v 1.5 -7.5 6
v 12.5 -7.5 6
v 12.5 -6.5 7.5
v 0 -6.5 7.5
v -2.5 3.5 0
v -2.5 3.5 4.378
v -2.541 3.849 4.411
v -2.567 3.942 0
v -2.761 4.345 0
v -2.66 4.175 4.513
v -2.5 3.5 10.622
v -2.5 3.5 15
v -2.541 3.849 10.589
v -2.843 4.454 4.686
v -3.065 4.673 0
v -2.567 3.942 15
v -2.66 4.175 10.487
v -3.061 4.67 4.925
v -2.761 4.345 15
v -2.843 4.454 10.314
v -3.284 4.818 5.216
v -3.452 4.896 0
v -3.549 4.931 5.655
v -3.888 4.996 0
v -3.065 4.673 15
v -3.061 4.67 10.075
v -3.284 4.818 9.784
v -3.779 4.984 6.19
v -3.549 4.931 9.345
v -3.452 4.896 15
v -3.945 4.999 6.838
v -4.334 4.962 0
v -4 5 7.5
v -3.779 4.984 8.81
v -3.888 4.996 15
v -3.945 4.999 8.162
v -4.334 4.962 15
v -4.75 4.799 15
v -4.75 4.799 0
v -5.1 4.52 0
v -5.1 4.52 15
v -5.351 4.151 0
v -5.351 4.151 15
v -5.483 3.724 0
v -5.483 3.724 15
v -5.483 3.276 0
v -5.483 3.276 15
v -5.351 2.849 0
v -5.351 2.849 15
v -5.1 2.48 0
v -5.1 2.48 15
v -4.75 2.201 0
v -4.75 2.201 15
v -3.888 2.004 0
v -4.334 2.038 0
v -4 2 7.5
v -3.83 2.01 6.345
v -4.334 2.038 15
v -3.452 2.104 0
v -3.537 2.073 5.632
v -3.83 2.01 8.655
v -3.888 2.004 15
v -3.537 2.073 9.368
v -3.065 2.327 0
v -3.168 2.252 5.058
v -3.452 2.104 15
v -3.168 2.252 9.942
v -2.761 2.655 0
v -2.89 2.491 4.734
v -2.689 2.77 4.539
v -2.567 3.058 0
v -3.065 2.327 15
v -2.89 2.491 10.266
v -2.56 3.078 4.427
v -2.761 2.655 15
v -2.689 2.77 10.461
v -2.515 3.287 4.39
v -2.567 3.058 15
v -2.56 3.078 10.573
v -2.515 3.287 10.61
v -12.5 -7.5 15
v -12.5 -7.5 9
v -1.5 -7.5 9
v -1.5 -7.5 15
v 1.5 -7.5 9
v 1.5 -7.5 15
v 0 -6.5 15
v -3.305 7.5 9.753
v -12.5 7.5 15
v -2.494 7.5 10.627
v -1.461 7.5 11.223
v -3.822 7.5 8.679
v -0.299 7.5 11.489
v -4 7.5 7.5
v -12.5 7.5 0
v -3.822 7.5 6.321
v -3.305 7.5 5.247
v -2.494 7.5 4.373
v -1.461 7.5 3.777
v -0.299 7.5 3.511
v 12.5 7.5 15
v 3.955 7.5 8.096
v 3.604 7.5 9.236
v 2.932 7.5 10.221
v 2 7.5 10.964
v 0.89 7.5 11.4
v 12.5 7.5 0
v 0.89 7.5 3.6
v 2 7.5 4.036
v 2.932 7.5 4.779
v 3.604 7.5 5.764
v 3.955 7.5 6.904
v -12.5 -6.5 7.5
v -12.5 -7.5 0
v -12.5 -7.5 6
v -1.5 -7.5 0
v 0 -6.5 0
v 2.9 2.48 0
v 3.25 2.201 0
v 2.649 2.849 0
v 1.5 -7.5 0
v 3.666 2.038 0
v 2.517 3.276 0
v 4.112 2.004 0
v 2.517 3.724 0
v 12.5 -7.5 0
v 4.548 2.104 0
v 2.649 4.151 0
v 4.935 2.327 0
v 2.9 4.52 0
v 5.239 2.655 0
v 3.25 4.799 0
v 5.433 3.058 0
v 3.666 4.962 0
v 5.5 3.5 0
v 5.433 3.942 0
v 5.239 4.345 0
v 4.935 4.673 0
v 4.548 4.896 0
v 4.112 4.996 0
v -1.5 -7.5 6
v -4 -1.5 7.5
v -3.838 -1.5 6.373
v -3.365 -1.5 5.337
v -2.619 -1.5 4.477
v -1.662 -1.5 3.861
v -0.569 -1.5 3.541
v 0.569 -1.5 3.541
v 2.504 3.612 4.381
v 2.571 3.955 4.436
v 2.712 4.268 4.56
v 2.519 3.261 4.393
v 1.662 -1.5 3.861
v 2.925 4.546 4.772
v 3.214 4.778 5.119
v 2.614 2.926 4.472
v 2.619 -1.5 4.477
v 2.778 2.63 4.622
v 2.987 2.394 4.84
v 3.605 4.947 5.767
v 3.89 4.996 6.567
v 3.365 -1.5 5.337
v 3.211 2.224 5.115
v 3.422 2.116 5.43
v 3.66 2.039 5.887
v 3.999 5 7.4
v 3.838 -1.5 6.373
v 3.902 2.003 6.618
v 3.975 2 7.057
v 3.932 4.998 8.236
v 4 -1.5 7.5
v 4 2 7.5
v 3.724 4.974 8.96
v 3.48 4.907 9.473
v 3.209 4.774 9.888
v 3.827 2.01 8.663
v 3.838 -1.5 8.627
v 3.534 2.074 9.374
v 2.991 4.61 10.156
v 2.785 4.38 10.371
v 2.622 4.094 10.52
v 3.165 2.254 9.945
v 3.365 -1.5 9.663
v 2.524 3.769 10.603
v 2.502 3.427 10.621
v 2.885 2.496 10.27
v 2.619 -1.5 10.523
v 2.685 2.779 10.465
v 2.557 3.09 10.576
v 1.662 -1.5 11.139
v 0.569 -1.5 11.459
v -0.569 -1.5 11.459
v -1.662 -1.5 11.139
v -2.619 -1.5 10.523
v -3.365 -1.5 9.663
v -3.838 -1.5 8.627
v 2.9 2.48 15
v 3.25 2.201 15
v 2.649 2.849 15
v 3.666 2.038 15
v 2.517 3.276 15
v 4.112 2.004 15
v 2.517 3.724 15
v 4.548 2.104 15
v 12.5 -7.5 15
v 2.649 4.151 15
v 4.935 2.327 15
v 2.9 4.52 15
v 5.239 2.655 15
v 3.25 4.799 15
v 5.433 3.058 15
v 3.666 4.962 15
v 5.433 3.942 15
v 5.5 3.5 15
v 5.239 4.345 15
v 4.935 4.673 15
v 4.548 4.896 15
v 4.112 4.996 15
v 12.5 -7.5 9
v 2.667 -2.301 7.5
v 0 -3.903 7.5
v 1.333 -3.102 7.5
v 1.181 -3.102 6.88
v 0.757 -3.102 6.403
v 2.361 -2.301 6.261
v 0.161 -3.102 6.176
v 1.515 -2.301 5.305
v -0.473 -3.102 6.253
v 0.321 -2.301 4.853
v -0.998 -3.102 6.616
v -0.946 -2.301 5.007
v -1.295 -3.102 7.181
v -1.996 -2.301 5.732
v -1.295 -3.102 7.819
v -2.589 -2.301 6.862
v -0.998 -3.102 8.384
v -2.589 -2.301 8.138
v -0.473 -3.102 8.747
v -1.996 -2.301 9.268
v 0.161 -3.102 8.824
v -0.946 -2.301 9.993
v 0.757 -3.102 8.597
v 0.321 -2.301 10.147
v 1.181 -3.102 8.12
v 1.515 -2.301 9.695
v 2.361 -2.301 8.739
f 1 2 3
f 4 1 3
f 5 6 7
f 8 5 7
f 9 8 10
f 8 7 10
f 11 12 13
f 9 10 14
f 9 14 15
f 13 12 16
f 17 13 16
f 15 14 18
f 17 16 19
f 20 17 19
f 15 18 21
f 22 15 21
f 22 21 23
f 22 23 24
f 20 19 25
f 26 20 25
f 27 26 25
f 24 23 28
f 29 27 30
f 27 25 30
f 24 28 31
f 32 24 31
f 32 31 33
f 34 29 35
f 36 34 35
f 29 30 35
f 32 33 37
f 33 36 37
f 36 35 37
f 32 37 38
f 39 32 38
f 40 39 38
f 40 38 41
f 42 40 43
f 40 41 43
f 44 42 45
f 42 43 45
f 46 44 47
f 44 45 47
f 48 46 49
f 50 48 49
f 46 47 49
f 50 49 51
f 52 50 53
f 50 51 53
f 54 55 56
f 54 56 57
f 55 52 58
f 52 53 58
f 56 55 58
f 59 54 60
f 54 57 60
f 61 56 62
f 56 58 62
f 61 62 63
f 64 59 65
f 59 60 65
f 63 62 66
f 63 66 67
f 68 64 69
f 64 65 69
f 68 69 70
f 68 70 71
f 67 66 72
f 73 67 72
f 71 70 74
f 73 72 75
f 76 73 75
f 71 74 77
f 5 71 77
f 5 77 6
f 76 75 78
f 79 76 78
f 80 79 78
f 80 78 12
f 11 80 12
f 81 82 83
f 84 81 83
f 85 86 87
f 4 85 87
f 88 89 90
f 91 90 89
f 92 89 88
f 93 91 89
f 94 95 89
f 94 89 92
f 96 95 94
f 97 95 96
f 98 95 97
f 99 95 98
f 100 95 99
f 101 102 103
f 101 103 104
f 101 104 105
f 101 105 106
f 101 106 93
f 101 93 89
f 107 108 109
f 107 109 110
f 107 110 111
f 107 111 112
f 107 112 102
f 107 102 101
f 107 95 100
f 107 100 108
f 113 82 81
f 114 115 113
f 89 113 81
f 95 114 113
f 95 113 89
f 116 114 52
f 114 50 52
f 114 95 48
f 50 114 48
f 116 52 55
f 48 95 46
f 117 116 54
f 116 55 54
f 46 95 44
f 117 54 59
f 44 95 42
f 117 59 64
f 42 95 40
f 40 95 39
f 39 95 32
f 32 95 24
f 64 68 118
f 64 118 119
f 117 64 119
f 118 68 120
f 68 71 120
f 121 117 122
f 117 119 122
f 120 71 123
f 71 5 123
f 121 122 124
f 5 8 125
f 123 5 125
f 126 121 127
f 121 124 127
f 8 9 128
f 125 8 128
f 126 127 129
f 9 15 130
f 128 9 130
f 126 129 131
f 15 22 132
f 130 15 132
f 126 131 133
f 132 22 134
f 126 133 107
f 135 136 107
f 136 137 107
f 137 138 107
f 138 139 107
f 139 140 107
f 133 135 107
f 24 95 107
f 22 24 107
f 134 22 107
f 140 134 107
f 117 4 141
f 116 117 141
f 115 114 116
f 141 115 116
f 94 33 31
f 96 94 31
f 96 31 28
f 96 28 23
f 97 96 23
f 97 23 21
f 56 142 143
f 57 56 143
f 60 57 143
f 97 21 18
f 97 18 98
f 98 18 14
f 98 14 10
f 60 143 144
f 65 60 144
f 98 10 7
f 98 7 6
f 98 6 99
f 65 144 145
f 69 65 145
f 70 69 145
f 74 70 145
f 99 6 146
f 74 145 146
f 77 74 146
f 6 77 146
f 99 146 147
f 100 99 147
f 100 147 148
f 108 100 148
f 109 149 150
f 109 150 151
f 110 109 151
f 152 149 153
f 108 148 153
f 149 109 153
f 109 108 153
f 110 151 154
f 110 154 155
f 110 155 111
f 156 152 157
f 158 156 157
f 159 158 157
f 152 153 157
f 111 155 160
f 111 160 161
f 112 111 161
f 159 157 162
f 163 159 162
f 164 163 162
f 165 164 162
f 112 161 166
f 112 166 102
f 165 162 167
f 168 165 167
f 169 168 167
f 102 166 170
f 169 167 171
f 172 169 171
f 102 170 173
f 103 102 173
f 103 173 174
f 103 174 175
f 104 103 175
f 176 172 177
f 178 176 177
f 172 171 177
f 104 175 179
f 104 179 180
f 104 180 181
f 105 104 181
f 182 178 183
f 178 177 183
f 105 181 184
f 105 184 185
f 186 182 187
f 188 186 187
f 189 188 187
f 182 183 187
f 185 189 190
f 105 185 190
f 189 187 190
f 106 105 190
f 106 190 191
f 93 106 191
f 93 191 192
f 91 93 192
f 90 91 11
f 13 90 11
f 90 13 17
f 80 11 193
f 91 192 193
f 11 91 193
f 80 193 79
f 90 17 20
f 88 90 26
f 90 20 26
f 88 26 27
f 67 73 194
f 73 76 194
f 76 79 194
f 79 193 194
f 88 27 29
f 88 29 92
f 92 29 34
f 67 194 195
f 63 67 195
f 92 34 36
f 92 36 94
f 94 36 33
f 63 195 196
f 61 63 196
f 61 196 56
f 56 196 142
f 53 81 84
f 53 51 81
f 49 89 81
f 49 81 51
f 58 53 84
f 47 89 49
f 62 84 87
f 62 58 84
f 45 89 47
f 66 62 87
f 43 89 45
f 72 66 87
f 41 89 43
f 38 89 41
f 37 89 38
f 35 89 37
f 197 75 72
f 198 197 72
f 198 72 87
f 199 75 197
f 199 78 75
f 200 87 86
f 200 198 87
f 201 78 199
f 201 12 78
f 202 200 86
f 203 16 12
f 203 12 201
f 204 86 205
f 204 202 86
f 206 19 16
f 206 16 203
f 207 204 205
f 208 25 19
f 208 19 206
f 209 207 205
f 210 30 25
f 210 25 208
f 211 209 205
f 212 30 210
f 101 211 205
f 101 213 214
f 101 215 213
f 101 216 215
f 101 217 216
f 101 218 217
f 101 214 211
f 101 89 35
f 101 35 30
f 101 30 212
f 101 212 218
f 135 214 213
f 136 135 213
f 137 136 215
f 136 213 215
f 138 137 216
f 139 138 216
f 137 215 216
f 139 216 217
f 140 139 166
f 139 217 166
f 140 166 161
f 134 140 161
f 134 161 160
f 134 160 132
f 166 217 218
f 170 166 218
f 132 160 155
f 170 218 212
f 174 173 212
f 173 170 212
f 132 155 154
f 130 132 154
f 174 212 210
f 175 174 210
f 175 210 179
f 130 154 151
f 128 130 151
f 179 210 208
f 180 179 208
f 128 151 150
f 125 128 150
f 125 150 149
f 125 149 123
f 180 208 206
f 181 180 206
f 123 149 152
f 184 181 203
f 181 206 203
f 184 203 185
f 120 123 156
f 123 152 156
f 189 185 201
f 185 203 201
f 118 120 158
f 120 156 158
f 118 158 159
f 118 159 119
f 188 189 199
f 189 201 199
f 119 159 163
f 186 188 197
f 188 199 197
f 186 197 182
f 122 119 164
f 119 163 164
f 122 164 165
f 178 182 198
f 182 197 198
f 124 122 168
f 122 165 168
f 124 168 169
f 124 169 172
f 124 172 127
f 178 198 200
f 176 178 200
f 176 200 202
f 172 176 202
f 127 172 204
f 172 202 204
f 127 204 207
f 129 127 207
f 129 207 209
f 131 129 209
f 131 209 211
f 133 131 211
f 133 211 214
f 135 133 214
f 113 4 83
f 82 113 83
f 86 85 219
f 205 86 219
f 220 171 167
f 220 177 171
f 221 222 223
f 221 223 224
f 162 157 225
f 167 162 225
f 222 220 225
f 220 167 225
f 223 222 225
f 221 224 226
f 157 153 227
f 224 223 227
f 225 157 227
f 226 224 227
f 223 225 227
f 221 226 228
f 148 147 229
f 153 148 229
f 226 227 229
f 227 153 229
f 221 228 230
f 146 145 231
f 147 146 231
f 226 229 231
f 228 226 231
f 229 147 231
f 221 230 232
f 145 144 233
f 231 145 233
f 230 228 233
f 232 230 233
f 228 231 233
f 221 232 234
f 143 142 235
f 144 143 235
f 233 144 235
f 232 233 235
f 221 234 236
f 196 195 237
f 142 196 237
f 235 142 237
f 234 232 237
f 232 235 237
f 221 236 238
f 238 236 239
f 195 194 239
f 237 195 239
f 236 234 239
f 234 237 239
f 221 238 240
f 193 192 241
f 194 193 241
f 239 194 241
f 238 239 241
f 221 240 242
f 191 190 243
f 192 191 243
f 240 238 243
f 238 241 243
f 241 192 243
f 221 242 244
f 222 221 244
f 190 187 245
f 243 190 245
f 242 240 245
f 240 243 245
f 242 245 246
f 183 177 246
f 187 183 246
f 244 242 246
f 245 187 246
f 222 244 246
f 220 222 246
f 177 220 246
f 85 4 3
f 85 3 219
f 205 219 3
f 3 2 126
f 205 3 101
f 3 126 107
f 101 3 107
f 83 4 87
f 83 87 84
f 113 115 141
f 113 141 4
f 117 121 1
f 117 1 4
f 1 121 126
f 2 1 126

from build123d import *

# Parameters (mm, degrees)
SKETCH1_W                 = 25
SKETCH1_H                 = 15
BOSS_EXTRUDE1_DEPTH       = 15
F_3_0MM_DOWEL_HOLE1_D     = 3
CUT_EXTRUDE1_DEPTH        = 15
CUT_EXTRUDE2_DEPTH        = 49
F_8_0MM_DOWEL_HOLE1_D     = 8
F_8_0MM_DOWEL_HOLE1_DEPTH = 9
F_8_0MM_DOWEL_HOLE1_TIP   = 2.403442476


with BuildPart() as part:
    # Sketch1 → Boss-Extrude1 (new body)
    with BuildSketch(Plane.XY):
        Rectangle(SKETCH1_W, SKETCH1_H)
    extrude(amount=BOSS_EXTRUDE1_DEPTH)

    # Ø3.0mm Dowel Hole1 (through all)
    with Locations(Plane(origin=(0, 0, 0), x_dir=(-1, 0, 0), z_dir=(0, 0, -1))):
        with Locations((4, 3.5), (-4, 3.5)):
            Hole(F_3_0MM_DOWEL_HOLE1_D / 2)

    # Sketch4 → Cut-Extrude1 (cut)
    with BuildSketch(Plane(origin=(0, 0, 0), x_dir=(-1, 0, 0), z_dir=(0, 0, -1))):
        Polygon((-1.5, -7.5), (0, -6.5), (1.5, -7.5), (1.5, -8.661877418), (-1.5, -8.661877418), align=None)
    extrude(amount=-CUT_EXTRUDE1_DEPTH, mode=Mode.SUBTRACT)

    # Sketch5 → Cut-Extrude2 (cut)
    with BuildSketch(Plane.ZY.offset(12.5)):
        Polygon((6, -7.5), (7.5, -6.5), (9, -7.5), (9, -8.497485746), (6.14045431, -8.497485746), align=None)
    extrude(amount=-CUT_EXTRUDE2_DEPTH, mode=Mode.SUBTRACT)

    # Ø8.0mm Dowel Hole1
    with Locations(Plane(origin=(0, 7.5, 0), x_dir=(1, 0, 0), z_dir=(0, 1, 0))):
        with Locations((0, -7.5)):
            Hole(F_8_0MM_DOWEL_HOLE1_D / 2, depth=F_8_0MM_DOWEL_HOLE1_DEPTH)
            with Locations((0, 0, -(F_8_0MM_DOWEL_HOLE1_DEPTH + F_8_0MM_DOWEL_HOLE1_TIP / 2))):  # 118° drill point
                Cone(0, F_8_0MM_DOWEL_HOLE1_D / 2, F_8_0MM_DOWEL_HOLE1_TIP, mode=Mode.SUBTRACT)


solid = part.part
